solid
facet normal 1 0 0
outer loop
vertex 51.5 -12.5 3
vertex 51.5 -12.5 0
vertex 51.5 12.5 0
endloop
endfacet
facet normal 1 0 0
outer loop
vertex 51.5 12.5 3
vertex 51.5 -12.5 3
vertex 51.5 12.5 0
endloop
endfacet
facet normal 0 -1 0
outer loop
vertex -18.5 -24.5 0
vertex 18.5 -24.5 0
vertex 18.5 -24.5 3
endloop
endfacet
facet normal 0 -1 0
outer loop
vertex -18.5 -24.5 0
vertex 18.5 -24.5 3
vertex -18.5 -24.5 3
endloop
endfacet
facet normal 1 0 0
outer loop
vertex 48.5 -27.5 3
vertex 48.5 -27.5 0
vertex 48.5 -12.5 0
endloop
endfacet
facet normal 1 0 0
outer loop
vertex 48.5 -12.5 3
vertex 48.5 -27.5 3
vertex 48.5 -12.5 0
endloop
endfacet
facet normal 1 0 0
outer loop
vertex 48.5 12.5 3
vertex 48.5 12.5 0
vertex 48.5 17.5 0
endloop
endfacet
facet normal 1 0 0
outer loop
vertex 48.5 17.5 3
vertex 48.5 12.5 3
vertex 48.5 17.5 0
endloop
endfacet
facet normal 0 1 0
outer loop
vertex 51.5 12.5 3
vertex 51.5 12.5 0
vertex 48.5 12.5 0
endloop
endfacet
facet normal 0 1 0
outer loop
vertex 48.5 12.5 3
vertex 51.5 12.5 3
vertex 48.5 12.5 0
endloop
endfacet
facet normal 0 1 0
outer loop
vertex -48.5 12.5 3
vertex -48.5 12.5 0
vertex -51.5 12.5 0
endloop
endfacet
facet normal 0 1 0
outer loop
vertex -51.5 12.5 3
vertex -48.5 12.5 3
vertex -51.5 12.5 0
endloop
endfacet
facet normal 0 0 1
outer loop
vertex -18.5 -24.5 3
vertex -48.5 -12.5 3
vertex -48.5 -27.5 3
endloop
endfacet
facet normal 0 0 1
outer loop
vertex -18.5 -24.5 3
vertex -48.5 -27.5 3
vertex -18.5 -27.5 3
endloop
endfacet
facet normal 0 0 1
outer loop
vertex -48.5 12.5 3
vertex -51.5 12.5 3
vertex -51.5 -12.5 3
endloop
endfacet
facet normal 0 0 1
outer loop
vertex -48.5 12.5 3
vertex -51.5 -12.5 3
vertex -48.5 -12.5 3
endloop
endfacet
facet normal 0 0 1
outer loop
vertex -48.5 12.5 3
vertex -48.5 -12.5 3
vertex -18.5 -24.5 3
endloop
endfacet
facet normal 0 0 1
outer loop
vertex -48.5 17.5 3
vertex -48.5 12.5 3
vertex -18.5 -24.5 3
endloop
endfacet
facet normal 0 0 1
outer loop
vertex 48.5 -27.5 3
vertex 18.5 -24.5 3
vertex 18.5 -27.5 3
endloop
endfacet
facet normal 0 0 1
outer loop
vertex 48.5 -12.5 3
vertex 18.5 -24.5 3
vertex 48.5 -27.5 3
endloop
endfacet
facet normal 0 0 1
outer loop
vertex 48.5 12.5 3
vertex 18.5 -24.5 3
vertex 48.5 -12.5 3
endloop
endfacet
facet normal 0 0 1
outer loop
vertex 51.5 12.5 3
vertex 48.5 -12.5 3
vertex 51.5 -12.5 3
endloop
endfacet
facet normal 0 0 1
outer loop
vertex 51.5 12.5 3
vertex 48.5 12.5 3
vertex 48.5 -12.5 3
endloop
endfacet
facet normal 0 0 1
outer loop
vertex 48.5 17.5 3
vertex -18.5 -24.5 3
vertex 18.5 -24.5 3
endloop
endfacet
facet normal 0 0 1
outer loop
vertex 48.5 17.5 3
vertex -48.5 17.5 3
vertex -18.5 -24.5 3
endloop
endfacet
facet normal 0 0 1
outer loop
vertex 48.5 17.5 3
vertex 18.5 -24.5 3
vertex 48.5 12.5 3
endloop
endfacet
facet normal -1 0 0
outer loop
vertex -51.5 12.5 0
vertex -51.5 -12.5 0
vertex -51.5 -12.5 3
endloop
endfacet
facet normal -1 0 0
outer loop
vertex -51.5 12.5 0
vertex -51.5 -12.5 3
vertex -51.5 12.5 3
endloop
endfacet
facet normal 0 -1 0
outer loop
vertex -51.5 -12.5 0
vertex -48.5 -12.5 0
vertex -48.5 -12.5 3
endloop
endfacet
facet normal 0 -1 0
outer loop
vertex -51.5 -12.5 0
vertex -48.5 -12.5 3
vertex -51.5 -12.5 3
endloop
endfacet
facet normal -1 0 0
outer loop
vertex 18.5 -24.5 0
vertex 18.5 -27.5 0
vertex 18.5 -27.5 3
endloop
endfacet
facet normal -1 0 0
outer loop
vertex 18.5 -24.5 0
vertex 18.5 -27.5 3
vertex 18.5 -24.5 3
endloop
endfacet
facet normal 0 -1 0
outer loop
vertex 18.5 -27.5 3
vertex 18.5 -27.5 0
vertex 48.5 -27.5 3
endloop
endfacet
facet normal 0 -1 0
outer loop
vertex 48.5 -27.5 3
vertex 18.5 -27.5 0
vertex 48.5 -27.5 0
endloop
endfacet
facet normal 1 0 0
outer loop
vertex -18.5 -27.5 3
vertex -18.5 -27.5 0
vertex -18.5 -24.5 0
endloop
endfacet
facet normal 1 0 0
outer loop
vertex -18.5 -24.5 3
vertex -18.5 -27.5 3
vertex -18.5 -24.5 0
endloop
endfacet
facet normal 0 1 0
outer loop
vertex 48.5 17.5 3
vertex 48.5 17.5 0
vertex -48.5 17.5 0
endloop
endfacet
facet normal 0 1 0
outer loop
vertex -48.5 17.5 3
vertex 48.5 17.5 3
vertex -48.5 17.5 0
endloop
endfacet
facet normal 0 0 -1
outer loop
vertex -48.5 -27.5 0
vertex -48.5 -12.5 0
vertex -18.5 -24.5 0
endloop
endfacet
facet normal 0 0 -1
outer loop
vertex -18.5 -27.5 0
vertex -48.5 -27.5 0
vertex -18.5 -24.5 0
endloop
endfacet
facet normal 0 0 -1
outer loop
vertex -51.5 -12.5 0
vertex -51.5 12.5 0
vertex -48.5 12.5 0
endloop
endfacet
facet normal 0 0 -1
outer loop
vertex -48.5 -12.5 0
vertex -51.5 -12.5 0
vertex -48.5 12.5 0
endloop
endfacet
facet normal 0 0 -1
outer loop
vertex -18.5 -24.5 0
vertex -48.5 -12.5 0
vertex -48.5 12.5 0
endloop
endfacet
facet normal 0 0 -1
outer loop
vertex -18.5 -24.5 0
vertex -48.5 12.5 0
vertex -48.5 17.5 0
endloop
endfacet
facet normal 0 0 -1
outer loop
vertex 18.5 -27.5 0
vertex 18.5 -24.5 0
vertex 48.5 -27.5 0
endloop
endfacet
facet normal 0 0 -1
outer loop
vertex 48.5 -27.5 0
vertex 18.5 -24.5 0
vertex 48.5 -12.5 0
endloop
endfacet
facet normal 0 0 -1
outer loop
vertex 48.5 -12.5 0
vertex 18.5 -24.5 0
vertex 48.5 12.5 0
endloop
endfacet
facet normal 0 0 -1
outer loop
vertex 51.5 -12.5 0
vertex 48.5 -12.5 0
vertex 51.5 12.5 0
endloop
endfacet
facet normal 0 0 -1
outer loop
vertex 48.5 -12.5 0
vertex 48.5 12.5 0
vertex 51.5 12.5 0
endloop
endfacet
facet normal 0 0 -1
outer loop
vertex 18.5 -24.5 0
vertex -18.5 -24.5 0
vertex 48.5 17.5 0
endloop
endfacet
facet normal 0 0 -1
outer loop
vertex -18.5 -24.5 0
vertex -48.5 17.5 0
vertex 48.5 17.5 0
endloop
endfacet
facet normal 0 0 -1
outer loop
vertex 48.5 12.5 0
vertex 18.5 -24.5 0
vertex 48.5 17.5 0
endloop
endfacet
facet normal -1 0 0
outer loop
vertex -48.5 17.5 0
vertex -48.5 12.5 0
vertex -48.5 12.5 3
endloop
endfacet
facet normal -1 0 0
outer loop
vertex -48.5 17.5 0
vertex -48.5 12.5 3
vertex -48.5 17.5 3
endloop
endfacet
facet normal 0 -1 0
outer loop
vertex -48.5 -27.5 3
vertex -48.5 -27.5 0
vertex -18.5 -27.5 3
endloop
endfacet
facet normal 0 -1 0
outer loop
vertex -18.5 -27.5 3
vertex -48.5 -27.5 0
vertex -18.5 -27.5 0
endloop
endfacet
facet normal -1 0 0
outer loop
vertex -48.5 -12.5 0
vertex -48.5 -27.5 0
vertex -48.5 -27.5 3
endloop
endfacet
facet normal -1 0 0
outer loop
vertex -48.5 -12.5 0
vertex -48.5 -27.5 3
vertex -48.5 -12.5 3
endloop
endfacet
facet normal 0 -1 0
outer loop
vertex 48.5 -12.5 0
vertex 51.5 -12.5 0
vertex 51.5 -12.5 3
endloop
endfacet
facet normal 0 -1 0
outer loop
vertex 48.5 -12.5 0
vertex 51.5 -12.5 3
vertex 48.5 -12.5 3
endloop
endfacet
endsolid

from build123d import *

# Parameters (mm, degrees)
ESBO_O1_W                = 103
ESBO_O1_H                = 55
RESSALTO_EXTRUS_O1_DEPTH = 3
ESBO_O2_W                = 3
ESBO_O2_H                = 15
CORTE_EXTRUS_O1_DEPTH    = 59.459387612
ESBO_O3_W                = 37
ESBO_O3_H                = 3
CORTE_EXTRUS_O2_DEPTH    = 59.459387612
ESBO_O4_W                = 97
ESBO_O4_H                = 10
CORTE_EXTRUS_O3_DEPTH    = 10


with BuildPart() as part:
    # Esboço1 → Ressalto-extrusão1 (new body)
    with BuildSketch(Plane.XY):
        Rectangle(ESBO_O1_W, ESBO_O1_H)
    extrude(amount=RESSALTO_EXTRUS_O1_DEPTH)

    # Esboço2 → Corte-extrusão1 (cut, through all)
    with BuildSketch(Plane(origin=(0, 0, 0), x_dir=(-1, 0, 0), z_dir=(0, 0, -1))):
        with Locations((-50, 20)):
            Rectangle(ESBO_O2_W, ESBO_O2_H)
        with Locations((-50, -20)):
            Rectangle(ESBO_O2_W, ESBO_O2_H)
        with Locations((50, 20)):
            Rectangle(ESBO_O2_W, ESBO_O2_H)
        with Locations((50, -20)):
            Rectangle(ESBO_O2_W, ESBO_O2_H)
    extrude(amount=-CORTE_EXTRUS_O1_DEPTH, mode=Mode.SUBTRACT)

    # Esboço3 → Corte-extrusão2 (cut, through all)
    with BuildSketch(Plane(origin=(0, 0, 0), x_dir=(-1, 0, 0), z_dir=(0, 0, -1))):
        with Locations((0, -26)):
            Rectangle(ESBO_O3_W, ESBO_O3_H)
    extrude(amount=-CORTE_EXTRUS_O2_DEPTH, mode=Mode.SUBTRACT)

    # Esboço4 → Corte-extrusão3 (cut)
    with BuildSketch(Plane(origin=(0, 0, 0), x_dir=(-1, 0, 0), z_dir=(0, 0, -1))):
        with Locations((0, 22.5)):
            Rectangle(ESBO_O4_W, ESBO_O4_H)
    extrude(amount=-CORTE_EXTRUS_O3_DEPTH, mode=Mode.SUBTRACT)


solid = part.part
